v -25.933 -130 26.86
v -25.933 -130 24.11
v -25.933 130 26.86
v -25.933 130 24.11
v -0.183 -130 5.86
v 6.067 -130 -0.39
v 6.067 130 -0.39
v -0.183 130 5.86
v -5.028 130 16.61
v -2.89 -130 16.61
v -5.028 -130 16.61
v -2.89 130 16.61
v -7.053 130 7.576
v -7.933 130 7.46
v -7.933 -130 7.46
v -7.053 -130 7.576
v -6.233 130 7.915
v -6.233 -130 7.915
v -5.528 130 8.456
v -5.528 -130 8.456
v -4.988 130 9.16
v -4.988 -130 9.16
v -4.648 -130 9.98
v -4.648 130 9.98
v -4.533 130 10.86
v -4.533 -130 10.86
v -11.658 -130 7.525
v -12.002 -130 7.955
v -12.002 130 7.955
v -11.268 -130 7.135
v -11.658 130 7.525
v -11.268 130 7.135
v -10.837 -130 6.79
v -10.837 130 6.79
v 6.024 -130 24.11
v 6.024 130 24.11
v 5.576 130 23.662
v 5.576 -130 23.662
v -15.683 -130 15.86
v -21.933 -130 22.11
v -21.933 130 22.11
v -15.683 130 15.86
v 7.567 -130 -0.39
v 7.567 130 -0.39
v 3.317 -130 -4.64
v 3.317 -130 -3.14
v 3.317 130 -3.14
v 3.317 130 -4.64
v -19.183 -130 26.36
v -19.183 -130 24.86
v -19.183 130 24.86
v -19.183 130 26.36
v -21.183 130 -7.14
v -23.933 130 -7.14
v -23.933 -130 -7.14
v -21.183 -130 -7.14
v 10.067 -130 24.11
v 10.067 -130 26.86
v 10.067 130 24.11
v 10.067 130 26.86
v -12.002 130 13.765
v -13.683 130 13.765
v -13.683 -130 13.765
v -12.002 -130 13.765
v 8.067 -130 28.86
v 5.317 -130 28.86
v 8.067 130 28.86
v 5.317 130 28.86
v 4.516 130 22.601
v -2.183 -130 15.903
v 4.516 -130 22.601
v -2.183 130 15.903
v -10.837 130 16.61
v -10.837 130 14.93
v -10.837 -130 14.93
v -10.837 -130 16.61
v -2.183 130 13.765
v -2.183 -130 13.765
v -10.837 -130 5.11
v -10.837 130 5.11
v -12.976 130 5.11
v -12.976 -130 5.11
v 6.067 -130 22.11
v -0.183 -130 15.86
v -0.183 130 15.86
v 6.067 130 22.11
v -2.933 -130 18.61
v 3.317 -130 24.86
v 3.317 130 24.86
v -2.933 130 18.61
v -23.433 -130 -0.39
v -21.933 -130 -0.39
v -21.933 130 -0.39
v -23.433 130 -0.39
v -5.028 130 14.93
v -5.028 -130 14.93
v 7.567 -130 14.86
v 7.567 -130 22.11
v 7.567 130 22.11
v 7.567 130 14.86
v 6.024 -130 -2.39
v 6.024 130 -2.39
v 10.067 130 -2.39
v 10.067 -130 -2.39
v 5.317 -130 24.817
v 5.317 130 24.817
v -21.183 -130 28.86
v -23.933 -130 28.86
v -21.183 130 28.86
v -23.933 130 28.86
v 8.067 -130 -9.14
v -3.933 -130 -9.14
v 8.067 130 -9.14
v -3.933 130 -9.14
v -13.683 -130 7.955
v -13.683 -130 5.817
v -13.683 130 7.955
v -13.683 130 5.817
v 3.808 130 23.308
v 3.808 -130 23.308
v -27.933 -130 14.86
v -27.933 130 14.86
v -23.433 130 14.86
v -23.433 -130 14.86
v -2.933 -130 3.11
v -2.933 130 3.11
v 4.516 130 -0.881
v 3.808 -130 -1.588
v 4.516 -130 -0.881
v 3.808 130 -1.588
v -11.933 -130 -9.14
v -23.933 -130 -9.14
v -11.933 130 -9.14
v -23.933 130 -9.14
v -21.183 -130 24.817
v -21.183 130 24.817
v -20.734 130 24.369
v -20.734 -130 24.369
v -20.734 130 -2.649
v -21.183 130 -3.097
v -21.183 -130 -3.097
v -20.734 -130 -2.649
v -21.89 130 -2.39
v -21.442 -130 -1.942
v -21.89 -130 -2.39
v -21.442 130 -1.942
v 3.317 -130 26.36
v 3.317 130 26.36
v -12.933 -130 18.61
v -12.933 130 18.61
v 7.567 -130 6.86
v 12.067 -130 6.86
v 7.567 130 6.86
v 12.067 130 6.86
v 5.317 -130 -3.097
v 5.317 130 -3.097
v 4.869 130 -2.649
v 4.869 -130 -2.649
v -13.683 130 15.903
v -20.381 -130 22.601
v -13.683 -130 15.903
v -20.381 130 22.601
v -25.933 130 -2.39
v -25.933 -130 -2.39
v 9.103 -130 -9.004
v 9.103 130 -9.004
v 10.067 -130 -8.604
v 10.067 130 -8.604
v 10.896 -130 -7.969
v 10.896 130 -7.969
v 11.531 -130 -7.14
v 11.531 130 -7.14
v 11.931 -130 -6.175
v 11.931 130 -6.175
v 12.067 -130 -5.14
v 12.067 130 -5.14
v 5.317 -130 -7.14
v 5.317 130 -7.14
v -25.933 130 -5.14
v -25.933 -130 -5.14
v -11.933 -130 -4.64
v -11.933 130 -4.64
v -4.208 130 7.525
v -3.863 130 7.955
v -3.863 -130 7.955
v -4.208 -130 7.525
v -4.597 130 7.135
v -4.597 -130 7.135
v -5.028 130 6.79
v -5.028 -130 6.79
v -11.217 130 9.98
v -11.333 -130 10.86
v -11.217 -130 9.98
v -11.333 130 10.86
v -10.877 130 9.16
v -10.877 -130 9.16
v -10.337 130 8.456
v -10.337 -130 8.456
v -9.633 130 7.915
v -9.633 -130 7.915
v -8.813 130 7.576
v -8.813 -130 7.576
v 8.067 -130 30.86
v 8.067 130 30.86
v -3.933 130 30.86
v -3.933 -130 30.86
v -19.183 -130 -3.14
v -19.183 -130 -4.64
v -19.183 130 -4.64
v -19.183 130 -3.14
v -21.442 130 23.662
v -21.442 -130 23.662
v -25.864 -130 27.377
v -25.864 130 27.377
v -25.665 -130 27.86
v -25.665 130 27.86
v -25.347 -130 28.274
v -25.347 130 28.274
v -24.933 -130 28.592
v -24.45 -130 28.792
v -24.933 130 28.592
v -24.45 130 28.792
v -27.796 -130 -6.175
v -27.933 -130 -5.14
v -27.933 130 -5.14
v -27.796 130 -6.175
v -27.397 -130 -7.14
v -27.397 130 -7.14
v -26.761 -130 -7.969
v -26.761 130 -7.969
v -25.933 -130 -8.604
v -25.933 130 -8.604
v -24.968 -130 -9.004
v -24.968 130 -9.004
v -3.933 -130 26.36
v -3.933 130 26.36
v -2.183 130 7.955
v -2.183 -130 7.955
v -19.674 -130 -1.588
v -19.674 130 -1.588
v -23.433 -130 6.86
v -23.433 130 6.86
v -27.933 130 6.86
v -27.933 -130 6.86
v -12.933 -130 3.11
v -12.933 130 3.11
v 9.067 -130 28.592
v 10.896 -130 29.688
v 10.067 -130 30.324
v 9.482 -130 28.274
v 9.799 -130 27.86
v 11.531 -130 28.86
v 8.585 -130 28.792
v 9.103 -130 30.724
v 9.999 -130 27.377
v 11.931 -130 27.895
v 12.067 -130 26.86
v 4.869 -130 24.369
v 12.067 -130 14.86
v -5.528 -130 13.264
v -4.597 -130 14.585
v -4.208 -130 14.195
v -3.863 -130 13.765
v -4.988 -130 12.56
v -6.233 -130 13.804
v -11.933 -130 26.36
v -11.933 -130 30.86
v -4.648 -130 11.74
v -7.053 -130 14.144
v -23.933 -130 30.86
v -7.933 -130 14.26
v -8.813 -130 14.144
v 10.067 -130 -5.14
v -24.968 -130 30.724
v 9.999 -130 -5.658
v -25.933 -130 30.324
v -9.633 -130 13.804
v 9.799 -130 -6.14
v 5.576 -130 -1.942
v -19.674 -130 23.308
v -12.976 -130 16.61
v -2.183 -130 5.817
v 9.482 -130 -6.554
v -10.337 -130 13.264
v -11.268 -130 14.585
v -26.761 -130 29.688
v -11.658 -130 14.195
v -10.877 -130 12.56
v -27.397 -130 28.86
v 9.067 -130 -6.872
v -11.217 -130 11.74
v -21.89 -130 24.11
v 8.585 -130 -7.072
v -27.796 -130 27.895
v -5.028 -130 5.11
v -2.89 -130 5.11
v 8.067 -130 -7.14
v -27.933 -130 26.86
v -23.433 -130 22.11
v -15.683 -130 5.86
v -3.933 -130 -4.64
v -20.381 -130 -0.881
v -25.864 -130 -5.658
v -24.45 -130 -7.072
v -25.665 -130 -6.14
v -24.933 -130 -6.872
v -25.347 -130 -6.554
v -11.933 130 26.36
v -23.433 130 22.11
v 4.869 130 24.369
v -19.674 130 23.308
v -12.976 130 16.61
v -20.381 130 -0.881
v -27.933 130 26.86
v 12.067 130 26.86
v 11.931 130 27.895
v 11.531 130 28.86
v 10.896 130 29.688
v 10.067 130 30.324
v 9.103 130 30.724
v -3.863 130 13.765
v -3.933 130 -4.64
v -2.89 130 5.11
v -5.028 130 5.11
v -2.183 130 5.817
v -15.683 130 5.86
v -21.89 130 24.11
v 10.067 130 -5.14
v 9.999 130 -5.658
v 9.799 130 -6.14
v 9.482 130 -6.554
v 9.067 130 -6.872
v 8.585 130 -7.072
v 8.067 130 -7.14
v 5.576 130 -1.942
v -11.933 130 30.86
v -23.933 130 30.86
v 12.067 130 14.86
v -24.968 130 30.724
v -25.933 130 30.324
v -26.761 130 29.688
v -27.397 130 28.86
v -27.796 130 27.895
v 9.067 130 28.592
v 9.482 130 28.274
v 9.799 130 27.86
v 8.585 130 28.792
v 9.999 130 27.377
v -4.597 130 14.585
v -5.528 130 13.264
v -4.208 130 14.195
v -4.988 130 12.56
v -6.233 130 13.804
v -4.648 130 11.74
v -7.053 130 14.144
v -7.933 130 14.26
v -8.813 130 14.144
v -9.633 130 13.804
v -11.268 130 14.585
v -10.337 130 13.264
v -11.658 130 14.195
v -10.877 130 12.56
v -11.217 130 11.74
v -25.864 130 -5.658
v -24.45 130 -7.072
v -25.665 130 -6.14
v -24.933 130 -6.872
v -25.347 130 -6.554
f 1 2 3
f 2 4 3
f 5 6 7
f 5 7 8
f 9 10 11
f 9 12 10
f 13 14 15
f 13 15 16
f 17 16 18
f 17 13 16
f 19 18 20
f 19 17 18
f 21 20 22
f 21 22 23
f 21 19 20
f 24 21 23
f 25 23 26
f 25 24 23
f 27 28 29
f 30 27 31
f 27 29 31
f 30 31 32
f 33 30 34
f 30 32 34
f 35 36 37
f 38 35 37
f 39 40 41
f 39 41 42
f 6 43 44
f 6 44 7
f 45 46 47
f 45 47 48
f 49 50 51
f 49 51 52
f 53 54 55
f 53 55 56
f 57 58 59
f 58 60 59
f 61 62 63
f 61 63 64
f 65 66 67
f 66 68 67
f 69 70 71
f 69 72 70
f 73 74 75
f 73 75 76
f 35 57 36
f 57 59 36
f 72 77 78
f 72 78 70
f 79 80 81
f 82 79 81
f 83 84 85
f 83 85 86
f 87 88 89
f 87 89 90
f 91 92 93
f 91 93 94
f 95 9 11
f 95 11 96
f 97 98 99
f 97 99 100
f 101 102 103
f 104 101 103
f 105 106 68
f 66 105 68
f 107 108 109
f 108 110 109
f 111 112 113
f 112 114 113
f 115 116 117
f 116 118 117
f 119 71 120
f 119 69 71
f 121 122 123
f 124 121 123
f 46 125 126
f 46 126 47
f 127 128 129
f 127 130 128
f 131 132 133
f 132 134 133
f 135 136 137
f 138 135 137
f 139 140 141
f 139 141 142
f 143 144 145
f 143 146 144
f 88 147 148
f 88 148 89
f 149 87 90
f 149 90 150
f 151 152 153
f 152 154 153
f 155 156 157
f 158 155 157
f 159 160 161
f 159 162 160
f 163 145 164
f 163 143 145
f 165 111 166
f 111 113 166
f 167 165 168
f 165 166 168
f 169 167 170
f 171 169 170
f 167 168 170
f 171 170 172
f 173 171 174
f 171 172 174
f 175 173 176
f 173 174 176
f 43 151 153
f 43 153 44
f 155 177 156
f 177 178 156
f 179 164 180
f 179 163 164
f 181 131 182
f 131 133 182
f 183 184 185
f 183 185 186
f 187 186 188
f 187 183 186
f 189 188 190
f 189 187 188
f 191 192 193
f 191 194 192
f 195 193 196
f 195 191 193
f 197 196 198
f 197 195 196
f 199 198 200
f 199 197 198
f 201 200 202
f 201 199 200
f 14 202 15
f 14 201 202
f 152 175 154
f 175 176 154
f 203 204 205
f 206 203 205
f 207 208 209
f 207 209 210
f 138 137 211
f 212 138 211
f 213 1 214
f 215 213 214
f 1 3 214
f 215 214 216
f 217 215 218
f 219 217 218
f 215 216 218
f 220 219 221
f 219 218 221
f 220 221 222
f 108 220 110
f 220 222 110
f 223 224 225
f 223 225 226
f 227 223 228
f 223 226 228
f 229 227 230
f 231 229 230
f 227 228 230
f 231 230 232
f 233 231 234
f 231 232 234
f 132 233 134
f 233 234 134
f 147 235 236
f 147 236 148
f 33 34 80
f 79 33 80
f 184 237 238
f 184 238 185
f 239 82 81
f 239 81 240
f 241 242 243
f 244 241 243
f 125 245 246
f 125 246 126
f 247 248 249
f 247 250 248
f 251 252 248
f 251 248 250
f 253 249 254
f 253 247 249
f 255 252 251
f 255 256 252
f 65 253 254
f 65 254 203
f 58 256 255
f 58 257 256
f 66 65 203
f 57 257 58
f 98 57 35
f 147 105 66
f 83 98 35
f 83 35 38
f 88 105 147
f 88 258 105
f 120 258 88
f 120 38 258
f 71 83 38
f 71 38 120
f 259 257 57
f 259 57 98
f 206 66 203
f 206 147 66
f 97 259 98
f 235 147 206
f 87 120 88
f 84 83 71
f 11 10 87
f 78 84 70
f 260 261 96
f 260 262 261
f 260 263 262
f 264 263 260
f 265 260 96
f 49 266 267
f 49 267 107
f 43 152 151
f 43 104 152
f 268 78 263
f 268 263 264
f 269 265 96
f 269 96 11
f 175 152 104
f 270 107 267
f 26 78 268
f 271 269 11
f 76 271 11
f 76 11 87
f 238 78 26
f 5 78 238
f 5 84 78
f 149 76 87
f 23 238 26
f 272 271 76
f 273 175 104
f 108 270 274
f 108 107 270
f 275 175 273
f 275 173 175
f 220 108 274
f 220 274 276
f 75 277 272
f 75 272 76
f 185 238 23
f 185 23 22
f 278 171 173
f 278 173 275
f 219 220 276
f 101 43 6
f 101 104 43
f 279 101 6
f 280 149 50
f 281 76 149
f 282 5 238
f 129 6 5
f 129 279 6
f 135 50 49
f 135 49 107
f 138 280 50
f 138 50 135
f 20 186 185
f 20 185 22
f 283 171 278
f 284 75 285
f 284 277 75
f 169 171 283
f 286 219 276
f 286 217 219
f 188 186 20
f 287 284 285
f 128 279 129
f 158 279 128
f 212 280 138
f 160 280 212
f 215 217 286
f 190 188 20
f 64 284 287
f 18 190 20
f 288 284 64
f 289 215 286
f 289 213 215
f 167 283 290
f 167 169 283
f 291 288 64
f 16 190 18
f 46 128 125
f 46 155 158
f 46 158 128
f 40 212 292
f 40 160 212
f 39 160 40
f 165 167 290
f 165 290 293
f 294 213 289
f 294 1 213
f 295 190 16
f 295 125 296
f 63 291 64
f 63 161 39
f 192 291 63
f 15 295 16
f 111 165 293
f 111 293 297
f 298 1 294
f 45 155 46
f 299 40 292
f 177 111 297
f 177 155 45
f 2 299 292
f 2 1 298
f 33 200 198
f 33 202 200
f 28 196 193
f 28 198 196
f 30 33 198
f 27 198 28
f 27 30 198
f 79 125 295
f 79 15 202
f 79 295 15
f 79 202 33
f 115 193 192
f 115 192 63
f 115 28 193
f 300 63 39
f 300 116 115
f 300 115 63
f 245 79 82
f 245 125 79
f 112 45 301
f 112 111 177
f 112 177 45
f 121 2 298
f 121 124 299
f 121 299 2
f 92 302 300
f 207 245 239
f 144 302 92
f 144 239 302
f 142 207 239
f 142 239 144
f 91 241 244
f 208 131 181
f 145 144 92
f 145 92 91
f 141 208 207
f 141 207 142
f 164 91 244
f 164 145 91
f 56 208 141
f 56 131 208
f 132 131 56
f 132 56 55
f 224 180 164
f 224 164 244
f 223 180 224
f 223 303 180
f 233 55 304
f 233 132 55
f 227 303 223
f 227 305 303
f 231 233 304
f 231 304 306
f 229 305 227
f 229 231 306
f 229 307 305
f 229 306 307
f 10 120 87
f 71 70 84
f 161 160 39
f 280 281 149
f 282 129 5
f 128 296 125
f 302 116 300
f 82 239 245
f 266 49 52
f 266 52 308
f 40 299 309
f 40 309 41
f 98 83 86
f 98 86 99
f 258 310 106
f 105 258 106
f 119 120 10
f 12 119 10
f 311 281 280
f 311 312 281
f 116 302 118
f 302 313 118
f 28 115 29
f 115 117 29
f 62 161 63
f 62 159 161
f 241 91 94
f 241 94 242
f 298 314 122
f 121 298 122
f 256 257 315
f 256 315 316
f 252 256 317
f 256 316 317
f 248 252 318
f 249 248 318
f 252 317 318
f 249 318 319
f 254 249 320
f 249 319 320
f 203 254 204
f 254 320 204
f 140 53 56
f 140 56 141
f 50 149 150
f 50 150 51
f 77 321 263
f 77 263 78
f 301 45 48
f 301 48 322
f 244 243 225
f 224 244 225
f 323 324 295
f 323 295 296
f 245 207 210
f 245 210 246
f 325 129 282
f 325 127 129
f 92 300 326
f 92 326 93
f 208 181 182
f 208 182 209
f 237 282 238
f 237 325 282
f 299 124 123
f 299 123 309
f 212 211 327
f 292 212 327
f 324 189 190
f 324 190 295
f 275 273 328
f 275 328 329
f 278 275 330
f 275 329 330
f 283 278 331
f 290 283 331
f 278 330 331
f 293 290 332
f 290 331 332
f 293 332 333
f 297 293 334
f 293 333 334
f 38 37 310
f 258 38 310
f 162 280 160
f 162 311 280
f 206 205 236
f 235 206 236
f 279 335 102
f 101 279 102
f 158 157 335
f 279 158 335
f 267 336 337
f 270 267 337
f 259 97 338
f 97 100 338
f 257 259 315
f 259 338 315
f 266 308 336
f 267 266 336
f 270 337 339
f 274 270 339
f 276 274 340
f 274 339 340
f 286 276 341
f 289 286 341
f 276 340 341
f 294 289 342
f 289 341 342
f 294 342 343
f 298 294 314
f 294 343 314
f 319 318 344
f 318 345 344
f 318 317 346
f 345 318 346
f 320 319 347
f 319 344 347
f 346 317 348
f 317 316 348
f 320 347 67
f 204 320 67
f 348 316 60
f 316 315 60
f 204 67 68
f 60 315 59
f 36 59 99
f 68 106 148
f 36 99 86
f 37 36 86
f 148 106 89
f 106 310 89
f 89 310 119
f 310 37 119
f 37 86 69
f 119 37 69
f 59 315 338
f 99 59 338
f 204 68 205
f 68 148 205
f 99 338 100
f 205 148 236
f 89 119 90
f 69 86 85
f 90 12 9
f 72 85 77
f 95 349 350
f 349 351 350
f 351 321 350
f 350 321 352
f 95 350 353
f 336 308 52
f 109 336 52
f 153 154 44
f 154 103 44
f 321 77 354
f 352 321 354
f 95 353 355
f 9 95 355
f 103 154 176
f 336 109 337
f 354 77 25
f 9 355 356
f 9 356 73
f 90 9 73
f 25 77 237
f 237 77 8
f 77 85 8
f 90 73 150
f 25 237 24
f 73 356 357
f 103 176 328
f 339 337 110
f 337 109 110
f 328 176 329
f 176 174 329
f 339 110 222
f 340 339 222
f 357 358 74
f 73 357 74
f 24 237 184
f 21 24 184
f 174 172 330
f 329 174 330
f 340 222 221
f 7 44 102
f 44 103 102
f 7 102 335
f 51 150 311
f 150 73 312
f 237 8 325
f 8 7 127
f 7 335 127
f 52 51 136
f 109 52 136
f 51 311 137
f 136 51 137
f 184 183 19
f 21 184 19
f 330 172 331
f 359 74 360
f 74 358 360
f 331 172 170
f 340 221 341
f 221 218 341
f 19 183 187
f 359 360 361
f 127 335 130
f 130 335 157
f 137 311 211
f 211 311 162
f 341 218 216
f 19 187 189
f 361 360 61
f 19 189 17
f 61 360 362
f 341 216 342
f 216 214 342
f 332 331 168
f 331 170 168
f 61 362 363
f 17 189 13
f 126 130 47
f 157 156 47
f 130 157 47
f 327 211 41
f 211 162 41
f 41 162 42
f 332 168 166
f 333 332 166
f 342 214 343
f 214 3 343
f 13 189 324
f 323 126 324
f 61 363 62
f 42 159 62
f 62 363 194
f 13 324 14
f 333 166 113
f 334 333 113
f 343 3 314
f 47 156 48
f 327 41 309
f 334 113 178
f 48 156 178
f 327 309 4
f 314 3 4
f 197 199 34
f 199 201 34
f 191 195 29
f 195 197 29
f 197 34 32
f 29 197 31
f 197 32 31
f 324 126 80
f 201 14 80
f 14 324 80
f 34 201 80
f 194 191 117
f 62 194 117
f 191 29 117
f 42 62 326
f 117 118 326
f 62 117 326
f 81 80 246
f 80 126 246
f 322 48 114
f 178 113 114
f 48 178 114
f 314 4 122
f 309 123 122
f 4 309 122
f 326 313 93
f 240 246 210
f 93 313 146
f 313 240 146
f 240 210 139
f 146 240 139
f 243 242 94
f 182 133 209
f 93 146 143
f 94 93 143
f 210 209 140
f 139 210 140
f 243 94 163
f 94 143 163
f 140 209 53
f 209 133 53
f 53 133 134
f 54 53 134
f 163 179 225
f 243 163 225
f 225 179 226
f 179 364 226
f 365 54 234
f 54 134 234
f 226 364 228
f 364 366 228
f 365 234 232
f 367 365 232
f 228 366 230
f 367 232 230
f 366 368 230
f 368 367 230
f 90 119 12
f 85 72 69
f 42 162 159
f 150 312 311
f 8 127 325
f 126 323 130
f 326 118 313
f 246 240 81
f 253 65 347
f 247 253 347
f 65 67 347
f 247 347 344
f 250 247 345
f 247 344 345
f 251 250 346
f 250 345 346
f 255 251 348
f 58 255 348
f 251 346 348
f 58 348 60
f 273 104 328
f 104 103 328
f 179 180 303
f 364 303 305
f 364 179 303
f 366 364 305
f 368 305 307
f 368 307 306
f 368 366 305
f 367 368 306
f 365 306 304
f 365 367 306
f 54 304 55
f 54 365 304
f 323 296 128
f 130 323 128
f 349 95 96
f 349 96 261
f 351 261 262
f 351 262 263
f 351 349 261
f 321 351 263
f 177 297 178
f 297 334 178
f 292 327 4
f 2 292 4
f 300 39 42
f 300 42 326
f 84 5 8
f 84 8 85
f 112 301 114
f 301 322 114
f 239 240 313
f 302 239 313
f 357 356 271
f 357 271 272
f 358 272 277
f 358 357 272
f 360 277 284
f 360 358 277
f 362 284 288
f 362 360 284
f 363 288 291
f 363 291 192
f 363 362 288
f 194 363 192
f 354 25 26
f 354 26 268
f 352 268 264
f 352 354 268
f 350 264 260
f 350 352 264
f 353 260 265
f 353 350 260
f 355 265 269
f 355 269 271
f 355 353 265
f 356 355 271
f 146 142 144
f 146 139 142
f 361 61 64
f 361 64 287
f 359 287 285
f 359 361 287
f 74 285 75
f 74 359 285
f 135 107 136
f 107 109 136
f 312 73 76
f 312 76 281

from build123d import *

# Parameters (mm, degrees)
BOSS_EXTRUDE1_DEPTH = 130


with BuildPart() as part:
    # Sketch1 → Boss-Extrude1 (new body, symmetric)
    with BuildSketch(Plane(origin=(0, 0, 0), x_dir=(1, 0, 0), z_dir=(0, 1, 0))):
        with BuildLine():
            Line((-27.932619, -6.859853), (-27.932619, 5.140147))
            ThreePointArc((-27.932619, 5.140147), (-26.761046, 7.968574), (-23.932619, 9.140147))
            Line((-23.932619, 9.140147), (-11.932619, 9.140147))
            Line((-11.932619, 9.140147), (-11.932619, 4.640147))
            Line((-11.932619, 4.640147), (-19.182619, 4.640147))
            Line((-19.182619, 4.640147), (-19.182619, 3.140147))
            Line((-19.182619, 3.140147), (-12.932619, -3.109853))
            Line((-12.932619, -3.109853), (-7.932619, -3.109853))
            Line((-7.932619, -3.109853), (-2.932619, -3.109853))
            Line((-2.932619, -3.109853), (3.317381, 3.140147))
            Line((3.317381, 3.140147), (3.317381, 4.640147))
            Line((3.317381, 4.640147), (-3.932619, 4.640147))
            Line((-3.932619, 4.640147), (-3.932619, 9.140147))
            Line((-3.932619, 9.140147), (8.067381, 9.140147))
            ThreePointArc((8.067381, 9.140147), (10.895808, 7.968574), (12.067381, 5.140147))
            Line((12.067381, 5.140147), (12.067381, -6.859853))
            Line((12.067381, -6.859853), (7.567381, -6.859853))
            Line((7.567381, -6.859853), (7.567381, 0.390147))
            Line((7.567381, 0.390147), (6.067381, 0.390147))
            Line((6.067381, 0.390147), (-0.182619, -5.859853))
            Line((-0.182619, -5.859853), (-0.182619, -10.859853))
            Line((-0.182619, -10.859853), (-0.182619, -15.859853))
            Line((-0.182619, -15.859853), (6.067381, -22.109853))
            Line((6.067381, -22.109853), (7.567381, -22.109853))
            Line((7.567381, -22.109853), (7.567381, -14.859853))
            Line((7.567381, -14.859853), (12.067381, -14.859853))
            Line((12.067381, -14.859853), (12.067381, -26.859853))
            ThreePointArc((12.067381, -26.859853), (10.895808, -29.68828), (8.067381, -30.859853))
            Line((8.067381, -30.859853), (-3.932619, -30.859853))
            Line((-3.932619, -30.859853), (-3.932619, -26.359853))
            Line((-3.932619, -26.359853), (3.317381, -26.359853))
            Line((3.317381, -26.359853), (3.317381, -24.859853))
            Line((3.317381, -24.859853), (-2.932619, -18.609853))
            Line((-2.932619, -18.609853), (-7.932619, -18.609853))
            Line((-7.932619, -18.609853), (-12.932619, -18.609853))
            Line((-12.932619, -18.609853), (-19.182619, -24.859853))
            Line((-19.182619, -24.859853), (-19.182619, -26.359853))
            Line((-19.182619, -26.359853), (-11.932619, -26.359853))
            Line((-11.932619, -26.359853), (-11.932619, -30.859853))
            Line((-11.932619, -30.859853), (-23.932619, -30.859853))
            ThreePointArc((-23.932619, -30.859853), (-26.761046, -29.68828), (-27.932619, -26.859853))
            Line((-27.932619, -26.859853), (-27.932619, -14.859853))
            Line((-27.932619, -14.859853), (-23.432619, -14.859853))
            Line((-23.432619, -14.859853), (-23.432619, -22.109853))
            Line((-23.432619, -22.109853), (-21.932619, -22.109853))
            Line((-21.932619, -22.109853), (-15.682619, -15.859853))
            Line((-15.682619, -15.859853), (-15.682619, -10.859853))
            Line((-15.682619, -10.859853), (-15.682619, -5.859853))
            Line((-15.682619, -5.859853), (-21.932619, 0.390147))
            Line((-21.932619, 0.390147), (-23.432619, 0.390147))
            Line((-23.432619, 0.390147), (-23.432619, -6.859853))
            Line((-23.432619, -6.859853), (-27.932619, -6.859853))
        make_face()
        with BuildLine():
            Line((-25.932619, 2.390147), (-25.932619, 5.140147))
            ThreePointArc((-25.932619, 5.140147), (-25.346832, 6.554361), (-23.932619, 7.140147))
            Line((-23.932619, 7.140147), (-21.182619, 7.140147))
            Line((-21.182619, 7.140147), (-21.182619, 3.097254))
            Line((-21.182619, 3.097254), (-20.734396, 2.649031))
            Line((-20.734396, 2.649031), (-21.441502, 1.941924))
            Line((-21.441502, 1.941924), (-21.889726, 2.390147))
            Line((-21.889726, 2.390147), (-25.932619, 2.390147))
        make_face(mode=Mode.SUBTRACT)
        with BuildLine():
            Line((-20.380842, 0.881264), (-13.682619, -5.816959))
            Line((-13.682619, -5.816959), (-13.682619, -7.955115))
            Line((-13.682619, -7.955115), (-13.182619, -7.955115))
            Line((-13.182619, -7.955115), (-12.002324, -7.955115))
            ThreePointArc((-12.002324, -7.955115), (-11.468153, -7.324319), (-10.837356, -6.790148))
            Line((-10.837356, -6.790148), (-10.837356, -5.609853))
            Line((-10.837356, -5.609853), (-10.837356, -5.109853))
            Line((-10.837356, -5.109853), (-12.975512, -5.109853))
            Line((-12.975512, -5.109853), (-19.673735, 1.588371))
            Line((-19.673735, 1.588371), (-20.380842, 0.881264))
        make_face(mode=Mode.SUBTRACT)
        with BuildLine():
            Line((10.067381, 2.390147), (10.067381, 5.140147))
            ThreePointArc((10.067381, 5.140147), (9.481595, 6.554361), (8.067381, 7.140147))
            Line((8.067381, 7.140147), (5.317381, 7.140147))
            Line((5.317381, 7.140147), (5.317381, 3.097254))
            Line((5.317381, 3.097254), (4.869158, 2.649031))
            Line((4.869158, 2.649031), (5.576265, 1.941924))
            Line((5.576265, 1.941924), (6.024488, 2.390147))
            Line((6.024488, 2.390147), (10.067381, 2.390147))
        make_face(mode=Mode.SUBTRACT)
        with BuildLine():
            Line((-2.182619, -5.816959), (-2.182619, -7.955115))
            Line((-2.182619, -7.955115), (-2.682619, -7.955115))
            Line((-2.682619, -7.955115), (-3.862914, -7.955115))
            ThreePointArc((-3.862914, -7.955115), (-4.397085, -7.324319), (-5.027881, -6.790148))
            Line((-5.027881, -6.790148), (-5.027881, -5.609853))
            Line((-5.027881, -5.609853), (-5.027881, -5.109853))
            Line((-5.027881, -5.109853), (-2.889726, -5.109853))
            Line((-2.889726, -5.109853), (3.808498, 1.588371))
            Line((3.808498, 1.588371), (4.515604, 0.881264))
            Line((4.515604, 0.881264), (-2.182619, -5.816959))
        make_face(mode=Mode.SUBTRACT)
        with BuildLine():
            Line((5.317381, -28.859853), (8.067381, -28.859853))
            ThreePointArc((8.067381, -28.859853), (9.481595, -28.274066), (10.067381, -26.859853))
            Line((10.067381, -26.859853), (10.067381, -24.109853))
            Line((10.067381, -24.109853), (6.024488, -24.109853))
            Line((6.024488, -24.109853), (5.576265, -23.661629))
            Line((5.576265, -23.661629), (4.869158, -24.368736))
            Line((4.869158, -24.368736), (5.317381, -24.816959))
            Line((5.317381, -24.816959), (5.317381, -28.859853))
        make_face(mode=Mode.SUBTRACT)
        with BuildLine():
            Line((-2.889726, -16.609853), (-5.027881, -16.609853))
            Line((-5.027881, -16.609853), (-5.027881, -16.109853))
            Line((-5.027881, -16.109853), (-5.027881, -14.929558))
            ThreePointArc((-5.027881, -14.929558), (-4.397085, -14.395387), (-3.862914, -13.76459))
            Line((-3.862914, -13.76459), (-2.682619, -13.76459))
            Line((-2.682619, -13.76459), (-2.182619, -13.76459))
            Line((-2.182619, -13.76459), (-2.182619, -15.902746))
            Line((-2.182619, -15.902746), (4.515604, -22.600969))
            Line((4.515604, -22.600969), (3.808498, -23.308076))
            Line((3.808498, -23.308076), (-2.889726, -16.609853))
        make_face(mode=Mode.SUBTRACT)
        with BuildLine():
            Line((-25.932619, -24.109853), (-25.932619, -26.859853))
            ThreePointArc((-25.932619, -26.859853), (-25.346832, -28.274066), (-23.932619, -28.859853))
            Line((-23.932619, -28.859853), (-21.182619, -28.859853))
            Line((-21.182619, -28.859853), (-21.182619, -24.816959))
            Line((-21.182619, -24.816959), (-20.734396, -24.368736))
            Line((-20.734396, -24.368736), (-21.441502, -23.661629))
            Line((-21.441502, -23.661629), (-21.889726, -24.109853))
            Line((-21.889726, -24.109853), (-25.932619, -24.109853))
        make_face(mode=Mode.SUBTRACT)
        with BuildLine():
            Line((-13.682619, -15.902746), (-13.682619, -13.76459))
            Line((-13.682619, -13.76459), (-13.182619, -13.76459))
            Line((-13.182619, -13.76459), (-12.002324, -13.76459))
            ThreePointArc((-12.002324, -13.76459), (-11.468153, -14.395387), (-10.837356, -14.929558))
            Line((-10.837356, -14.929558), (-10.837356, -16.109853))
            Line((-10.837356, -16.109853), (-10.837356, -16.609853))
            Line((-10.837356, -16.609853), (-12.975512, -16.609853))
            Line((-12.975512, -16.609853), (-19.673735, -23.308076))
            Line((-19.673735, -23.308076), (-20.380842, -22.600969))
            Line((-20.380842, -22.600969), (-13.682619, -15.902746))
        make_face(mode=Mode.SUBTRACT)
        with BuildLine():
            ThreePointArc((-11.332619, -10.859853), (-10.336782, -8.45569), (-7.932619, -7.459853))
            ThreePointArc((-7.932619, -7.459853), (-5.528456, -8.45569), (-4.532619, -10.859853))
            ThreePointArc((-4.532619, -10.859853), (-5.528456, -13.264016), (-7.932619, -14.259853))
            ThreePointArc((-7.932619, -14.259853), (-10.336782, -13.264016), (-11.332619, -10.859853))
        make_face(mode=Mode.SUBTRACT)
    extrude(amount=BOSS_EXTRUDE1_DEPTH, both=True)


solid = part.part
